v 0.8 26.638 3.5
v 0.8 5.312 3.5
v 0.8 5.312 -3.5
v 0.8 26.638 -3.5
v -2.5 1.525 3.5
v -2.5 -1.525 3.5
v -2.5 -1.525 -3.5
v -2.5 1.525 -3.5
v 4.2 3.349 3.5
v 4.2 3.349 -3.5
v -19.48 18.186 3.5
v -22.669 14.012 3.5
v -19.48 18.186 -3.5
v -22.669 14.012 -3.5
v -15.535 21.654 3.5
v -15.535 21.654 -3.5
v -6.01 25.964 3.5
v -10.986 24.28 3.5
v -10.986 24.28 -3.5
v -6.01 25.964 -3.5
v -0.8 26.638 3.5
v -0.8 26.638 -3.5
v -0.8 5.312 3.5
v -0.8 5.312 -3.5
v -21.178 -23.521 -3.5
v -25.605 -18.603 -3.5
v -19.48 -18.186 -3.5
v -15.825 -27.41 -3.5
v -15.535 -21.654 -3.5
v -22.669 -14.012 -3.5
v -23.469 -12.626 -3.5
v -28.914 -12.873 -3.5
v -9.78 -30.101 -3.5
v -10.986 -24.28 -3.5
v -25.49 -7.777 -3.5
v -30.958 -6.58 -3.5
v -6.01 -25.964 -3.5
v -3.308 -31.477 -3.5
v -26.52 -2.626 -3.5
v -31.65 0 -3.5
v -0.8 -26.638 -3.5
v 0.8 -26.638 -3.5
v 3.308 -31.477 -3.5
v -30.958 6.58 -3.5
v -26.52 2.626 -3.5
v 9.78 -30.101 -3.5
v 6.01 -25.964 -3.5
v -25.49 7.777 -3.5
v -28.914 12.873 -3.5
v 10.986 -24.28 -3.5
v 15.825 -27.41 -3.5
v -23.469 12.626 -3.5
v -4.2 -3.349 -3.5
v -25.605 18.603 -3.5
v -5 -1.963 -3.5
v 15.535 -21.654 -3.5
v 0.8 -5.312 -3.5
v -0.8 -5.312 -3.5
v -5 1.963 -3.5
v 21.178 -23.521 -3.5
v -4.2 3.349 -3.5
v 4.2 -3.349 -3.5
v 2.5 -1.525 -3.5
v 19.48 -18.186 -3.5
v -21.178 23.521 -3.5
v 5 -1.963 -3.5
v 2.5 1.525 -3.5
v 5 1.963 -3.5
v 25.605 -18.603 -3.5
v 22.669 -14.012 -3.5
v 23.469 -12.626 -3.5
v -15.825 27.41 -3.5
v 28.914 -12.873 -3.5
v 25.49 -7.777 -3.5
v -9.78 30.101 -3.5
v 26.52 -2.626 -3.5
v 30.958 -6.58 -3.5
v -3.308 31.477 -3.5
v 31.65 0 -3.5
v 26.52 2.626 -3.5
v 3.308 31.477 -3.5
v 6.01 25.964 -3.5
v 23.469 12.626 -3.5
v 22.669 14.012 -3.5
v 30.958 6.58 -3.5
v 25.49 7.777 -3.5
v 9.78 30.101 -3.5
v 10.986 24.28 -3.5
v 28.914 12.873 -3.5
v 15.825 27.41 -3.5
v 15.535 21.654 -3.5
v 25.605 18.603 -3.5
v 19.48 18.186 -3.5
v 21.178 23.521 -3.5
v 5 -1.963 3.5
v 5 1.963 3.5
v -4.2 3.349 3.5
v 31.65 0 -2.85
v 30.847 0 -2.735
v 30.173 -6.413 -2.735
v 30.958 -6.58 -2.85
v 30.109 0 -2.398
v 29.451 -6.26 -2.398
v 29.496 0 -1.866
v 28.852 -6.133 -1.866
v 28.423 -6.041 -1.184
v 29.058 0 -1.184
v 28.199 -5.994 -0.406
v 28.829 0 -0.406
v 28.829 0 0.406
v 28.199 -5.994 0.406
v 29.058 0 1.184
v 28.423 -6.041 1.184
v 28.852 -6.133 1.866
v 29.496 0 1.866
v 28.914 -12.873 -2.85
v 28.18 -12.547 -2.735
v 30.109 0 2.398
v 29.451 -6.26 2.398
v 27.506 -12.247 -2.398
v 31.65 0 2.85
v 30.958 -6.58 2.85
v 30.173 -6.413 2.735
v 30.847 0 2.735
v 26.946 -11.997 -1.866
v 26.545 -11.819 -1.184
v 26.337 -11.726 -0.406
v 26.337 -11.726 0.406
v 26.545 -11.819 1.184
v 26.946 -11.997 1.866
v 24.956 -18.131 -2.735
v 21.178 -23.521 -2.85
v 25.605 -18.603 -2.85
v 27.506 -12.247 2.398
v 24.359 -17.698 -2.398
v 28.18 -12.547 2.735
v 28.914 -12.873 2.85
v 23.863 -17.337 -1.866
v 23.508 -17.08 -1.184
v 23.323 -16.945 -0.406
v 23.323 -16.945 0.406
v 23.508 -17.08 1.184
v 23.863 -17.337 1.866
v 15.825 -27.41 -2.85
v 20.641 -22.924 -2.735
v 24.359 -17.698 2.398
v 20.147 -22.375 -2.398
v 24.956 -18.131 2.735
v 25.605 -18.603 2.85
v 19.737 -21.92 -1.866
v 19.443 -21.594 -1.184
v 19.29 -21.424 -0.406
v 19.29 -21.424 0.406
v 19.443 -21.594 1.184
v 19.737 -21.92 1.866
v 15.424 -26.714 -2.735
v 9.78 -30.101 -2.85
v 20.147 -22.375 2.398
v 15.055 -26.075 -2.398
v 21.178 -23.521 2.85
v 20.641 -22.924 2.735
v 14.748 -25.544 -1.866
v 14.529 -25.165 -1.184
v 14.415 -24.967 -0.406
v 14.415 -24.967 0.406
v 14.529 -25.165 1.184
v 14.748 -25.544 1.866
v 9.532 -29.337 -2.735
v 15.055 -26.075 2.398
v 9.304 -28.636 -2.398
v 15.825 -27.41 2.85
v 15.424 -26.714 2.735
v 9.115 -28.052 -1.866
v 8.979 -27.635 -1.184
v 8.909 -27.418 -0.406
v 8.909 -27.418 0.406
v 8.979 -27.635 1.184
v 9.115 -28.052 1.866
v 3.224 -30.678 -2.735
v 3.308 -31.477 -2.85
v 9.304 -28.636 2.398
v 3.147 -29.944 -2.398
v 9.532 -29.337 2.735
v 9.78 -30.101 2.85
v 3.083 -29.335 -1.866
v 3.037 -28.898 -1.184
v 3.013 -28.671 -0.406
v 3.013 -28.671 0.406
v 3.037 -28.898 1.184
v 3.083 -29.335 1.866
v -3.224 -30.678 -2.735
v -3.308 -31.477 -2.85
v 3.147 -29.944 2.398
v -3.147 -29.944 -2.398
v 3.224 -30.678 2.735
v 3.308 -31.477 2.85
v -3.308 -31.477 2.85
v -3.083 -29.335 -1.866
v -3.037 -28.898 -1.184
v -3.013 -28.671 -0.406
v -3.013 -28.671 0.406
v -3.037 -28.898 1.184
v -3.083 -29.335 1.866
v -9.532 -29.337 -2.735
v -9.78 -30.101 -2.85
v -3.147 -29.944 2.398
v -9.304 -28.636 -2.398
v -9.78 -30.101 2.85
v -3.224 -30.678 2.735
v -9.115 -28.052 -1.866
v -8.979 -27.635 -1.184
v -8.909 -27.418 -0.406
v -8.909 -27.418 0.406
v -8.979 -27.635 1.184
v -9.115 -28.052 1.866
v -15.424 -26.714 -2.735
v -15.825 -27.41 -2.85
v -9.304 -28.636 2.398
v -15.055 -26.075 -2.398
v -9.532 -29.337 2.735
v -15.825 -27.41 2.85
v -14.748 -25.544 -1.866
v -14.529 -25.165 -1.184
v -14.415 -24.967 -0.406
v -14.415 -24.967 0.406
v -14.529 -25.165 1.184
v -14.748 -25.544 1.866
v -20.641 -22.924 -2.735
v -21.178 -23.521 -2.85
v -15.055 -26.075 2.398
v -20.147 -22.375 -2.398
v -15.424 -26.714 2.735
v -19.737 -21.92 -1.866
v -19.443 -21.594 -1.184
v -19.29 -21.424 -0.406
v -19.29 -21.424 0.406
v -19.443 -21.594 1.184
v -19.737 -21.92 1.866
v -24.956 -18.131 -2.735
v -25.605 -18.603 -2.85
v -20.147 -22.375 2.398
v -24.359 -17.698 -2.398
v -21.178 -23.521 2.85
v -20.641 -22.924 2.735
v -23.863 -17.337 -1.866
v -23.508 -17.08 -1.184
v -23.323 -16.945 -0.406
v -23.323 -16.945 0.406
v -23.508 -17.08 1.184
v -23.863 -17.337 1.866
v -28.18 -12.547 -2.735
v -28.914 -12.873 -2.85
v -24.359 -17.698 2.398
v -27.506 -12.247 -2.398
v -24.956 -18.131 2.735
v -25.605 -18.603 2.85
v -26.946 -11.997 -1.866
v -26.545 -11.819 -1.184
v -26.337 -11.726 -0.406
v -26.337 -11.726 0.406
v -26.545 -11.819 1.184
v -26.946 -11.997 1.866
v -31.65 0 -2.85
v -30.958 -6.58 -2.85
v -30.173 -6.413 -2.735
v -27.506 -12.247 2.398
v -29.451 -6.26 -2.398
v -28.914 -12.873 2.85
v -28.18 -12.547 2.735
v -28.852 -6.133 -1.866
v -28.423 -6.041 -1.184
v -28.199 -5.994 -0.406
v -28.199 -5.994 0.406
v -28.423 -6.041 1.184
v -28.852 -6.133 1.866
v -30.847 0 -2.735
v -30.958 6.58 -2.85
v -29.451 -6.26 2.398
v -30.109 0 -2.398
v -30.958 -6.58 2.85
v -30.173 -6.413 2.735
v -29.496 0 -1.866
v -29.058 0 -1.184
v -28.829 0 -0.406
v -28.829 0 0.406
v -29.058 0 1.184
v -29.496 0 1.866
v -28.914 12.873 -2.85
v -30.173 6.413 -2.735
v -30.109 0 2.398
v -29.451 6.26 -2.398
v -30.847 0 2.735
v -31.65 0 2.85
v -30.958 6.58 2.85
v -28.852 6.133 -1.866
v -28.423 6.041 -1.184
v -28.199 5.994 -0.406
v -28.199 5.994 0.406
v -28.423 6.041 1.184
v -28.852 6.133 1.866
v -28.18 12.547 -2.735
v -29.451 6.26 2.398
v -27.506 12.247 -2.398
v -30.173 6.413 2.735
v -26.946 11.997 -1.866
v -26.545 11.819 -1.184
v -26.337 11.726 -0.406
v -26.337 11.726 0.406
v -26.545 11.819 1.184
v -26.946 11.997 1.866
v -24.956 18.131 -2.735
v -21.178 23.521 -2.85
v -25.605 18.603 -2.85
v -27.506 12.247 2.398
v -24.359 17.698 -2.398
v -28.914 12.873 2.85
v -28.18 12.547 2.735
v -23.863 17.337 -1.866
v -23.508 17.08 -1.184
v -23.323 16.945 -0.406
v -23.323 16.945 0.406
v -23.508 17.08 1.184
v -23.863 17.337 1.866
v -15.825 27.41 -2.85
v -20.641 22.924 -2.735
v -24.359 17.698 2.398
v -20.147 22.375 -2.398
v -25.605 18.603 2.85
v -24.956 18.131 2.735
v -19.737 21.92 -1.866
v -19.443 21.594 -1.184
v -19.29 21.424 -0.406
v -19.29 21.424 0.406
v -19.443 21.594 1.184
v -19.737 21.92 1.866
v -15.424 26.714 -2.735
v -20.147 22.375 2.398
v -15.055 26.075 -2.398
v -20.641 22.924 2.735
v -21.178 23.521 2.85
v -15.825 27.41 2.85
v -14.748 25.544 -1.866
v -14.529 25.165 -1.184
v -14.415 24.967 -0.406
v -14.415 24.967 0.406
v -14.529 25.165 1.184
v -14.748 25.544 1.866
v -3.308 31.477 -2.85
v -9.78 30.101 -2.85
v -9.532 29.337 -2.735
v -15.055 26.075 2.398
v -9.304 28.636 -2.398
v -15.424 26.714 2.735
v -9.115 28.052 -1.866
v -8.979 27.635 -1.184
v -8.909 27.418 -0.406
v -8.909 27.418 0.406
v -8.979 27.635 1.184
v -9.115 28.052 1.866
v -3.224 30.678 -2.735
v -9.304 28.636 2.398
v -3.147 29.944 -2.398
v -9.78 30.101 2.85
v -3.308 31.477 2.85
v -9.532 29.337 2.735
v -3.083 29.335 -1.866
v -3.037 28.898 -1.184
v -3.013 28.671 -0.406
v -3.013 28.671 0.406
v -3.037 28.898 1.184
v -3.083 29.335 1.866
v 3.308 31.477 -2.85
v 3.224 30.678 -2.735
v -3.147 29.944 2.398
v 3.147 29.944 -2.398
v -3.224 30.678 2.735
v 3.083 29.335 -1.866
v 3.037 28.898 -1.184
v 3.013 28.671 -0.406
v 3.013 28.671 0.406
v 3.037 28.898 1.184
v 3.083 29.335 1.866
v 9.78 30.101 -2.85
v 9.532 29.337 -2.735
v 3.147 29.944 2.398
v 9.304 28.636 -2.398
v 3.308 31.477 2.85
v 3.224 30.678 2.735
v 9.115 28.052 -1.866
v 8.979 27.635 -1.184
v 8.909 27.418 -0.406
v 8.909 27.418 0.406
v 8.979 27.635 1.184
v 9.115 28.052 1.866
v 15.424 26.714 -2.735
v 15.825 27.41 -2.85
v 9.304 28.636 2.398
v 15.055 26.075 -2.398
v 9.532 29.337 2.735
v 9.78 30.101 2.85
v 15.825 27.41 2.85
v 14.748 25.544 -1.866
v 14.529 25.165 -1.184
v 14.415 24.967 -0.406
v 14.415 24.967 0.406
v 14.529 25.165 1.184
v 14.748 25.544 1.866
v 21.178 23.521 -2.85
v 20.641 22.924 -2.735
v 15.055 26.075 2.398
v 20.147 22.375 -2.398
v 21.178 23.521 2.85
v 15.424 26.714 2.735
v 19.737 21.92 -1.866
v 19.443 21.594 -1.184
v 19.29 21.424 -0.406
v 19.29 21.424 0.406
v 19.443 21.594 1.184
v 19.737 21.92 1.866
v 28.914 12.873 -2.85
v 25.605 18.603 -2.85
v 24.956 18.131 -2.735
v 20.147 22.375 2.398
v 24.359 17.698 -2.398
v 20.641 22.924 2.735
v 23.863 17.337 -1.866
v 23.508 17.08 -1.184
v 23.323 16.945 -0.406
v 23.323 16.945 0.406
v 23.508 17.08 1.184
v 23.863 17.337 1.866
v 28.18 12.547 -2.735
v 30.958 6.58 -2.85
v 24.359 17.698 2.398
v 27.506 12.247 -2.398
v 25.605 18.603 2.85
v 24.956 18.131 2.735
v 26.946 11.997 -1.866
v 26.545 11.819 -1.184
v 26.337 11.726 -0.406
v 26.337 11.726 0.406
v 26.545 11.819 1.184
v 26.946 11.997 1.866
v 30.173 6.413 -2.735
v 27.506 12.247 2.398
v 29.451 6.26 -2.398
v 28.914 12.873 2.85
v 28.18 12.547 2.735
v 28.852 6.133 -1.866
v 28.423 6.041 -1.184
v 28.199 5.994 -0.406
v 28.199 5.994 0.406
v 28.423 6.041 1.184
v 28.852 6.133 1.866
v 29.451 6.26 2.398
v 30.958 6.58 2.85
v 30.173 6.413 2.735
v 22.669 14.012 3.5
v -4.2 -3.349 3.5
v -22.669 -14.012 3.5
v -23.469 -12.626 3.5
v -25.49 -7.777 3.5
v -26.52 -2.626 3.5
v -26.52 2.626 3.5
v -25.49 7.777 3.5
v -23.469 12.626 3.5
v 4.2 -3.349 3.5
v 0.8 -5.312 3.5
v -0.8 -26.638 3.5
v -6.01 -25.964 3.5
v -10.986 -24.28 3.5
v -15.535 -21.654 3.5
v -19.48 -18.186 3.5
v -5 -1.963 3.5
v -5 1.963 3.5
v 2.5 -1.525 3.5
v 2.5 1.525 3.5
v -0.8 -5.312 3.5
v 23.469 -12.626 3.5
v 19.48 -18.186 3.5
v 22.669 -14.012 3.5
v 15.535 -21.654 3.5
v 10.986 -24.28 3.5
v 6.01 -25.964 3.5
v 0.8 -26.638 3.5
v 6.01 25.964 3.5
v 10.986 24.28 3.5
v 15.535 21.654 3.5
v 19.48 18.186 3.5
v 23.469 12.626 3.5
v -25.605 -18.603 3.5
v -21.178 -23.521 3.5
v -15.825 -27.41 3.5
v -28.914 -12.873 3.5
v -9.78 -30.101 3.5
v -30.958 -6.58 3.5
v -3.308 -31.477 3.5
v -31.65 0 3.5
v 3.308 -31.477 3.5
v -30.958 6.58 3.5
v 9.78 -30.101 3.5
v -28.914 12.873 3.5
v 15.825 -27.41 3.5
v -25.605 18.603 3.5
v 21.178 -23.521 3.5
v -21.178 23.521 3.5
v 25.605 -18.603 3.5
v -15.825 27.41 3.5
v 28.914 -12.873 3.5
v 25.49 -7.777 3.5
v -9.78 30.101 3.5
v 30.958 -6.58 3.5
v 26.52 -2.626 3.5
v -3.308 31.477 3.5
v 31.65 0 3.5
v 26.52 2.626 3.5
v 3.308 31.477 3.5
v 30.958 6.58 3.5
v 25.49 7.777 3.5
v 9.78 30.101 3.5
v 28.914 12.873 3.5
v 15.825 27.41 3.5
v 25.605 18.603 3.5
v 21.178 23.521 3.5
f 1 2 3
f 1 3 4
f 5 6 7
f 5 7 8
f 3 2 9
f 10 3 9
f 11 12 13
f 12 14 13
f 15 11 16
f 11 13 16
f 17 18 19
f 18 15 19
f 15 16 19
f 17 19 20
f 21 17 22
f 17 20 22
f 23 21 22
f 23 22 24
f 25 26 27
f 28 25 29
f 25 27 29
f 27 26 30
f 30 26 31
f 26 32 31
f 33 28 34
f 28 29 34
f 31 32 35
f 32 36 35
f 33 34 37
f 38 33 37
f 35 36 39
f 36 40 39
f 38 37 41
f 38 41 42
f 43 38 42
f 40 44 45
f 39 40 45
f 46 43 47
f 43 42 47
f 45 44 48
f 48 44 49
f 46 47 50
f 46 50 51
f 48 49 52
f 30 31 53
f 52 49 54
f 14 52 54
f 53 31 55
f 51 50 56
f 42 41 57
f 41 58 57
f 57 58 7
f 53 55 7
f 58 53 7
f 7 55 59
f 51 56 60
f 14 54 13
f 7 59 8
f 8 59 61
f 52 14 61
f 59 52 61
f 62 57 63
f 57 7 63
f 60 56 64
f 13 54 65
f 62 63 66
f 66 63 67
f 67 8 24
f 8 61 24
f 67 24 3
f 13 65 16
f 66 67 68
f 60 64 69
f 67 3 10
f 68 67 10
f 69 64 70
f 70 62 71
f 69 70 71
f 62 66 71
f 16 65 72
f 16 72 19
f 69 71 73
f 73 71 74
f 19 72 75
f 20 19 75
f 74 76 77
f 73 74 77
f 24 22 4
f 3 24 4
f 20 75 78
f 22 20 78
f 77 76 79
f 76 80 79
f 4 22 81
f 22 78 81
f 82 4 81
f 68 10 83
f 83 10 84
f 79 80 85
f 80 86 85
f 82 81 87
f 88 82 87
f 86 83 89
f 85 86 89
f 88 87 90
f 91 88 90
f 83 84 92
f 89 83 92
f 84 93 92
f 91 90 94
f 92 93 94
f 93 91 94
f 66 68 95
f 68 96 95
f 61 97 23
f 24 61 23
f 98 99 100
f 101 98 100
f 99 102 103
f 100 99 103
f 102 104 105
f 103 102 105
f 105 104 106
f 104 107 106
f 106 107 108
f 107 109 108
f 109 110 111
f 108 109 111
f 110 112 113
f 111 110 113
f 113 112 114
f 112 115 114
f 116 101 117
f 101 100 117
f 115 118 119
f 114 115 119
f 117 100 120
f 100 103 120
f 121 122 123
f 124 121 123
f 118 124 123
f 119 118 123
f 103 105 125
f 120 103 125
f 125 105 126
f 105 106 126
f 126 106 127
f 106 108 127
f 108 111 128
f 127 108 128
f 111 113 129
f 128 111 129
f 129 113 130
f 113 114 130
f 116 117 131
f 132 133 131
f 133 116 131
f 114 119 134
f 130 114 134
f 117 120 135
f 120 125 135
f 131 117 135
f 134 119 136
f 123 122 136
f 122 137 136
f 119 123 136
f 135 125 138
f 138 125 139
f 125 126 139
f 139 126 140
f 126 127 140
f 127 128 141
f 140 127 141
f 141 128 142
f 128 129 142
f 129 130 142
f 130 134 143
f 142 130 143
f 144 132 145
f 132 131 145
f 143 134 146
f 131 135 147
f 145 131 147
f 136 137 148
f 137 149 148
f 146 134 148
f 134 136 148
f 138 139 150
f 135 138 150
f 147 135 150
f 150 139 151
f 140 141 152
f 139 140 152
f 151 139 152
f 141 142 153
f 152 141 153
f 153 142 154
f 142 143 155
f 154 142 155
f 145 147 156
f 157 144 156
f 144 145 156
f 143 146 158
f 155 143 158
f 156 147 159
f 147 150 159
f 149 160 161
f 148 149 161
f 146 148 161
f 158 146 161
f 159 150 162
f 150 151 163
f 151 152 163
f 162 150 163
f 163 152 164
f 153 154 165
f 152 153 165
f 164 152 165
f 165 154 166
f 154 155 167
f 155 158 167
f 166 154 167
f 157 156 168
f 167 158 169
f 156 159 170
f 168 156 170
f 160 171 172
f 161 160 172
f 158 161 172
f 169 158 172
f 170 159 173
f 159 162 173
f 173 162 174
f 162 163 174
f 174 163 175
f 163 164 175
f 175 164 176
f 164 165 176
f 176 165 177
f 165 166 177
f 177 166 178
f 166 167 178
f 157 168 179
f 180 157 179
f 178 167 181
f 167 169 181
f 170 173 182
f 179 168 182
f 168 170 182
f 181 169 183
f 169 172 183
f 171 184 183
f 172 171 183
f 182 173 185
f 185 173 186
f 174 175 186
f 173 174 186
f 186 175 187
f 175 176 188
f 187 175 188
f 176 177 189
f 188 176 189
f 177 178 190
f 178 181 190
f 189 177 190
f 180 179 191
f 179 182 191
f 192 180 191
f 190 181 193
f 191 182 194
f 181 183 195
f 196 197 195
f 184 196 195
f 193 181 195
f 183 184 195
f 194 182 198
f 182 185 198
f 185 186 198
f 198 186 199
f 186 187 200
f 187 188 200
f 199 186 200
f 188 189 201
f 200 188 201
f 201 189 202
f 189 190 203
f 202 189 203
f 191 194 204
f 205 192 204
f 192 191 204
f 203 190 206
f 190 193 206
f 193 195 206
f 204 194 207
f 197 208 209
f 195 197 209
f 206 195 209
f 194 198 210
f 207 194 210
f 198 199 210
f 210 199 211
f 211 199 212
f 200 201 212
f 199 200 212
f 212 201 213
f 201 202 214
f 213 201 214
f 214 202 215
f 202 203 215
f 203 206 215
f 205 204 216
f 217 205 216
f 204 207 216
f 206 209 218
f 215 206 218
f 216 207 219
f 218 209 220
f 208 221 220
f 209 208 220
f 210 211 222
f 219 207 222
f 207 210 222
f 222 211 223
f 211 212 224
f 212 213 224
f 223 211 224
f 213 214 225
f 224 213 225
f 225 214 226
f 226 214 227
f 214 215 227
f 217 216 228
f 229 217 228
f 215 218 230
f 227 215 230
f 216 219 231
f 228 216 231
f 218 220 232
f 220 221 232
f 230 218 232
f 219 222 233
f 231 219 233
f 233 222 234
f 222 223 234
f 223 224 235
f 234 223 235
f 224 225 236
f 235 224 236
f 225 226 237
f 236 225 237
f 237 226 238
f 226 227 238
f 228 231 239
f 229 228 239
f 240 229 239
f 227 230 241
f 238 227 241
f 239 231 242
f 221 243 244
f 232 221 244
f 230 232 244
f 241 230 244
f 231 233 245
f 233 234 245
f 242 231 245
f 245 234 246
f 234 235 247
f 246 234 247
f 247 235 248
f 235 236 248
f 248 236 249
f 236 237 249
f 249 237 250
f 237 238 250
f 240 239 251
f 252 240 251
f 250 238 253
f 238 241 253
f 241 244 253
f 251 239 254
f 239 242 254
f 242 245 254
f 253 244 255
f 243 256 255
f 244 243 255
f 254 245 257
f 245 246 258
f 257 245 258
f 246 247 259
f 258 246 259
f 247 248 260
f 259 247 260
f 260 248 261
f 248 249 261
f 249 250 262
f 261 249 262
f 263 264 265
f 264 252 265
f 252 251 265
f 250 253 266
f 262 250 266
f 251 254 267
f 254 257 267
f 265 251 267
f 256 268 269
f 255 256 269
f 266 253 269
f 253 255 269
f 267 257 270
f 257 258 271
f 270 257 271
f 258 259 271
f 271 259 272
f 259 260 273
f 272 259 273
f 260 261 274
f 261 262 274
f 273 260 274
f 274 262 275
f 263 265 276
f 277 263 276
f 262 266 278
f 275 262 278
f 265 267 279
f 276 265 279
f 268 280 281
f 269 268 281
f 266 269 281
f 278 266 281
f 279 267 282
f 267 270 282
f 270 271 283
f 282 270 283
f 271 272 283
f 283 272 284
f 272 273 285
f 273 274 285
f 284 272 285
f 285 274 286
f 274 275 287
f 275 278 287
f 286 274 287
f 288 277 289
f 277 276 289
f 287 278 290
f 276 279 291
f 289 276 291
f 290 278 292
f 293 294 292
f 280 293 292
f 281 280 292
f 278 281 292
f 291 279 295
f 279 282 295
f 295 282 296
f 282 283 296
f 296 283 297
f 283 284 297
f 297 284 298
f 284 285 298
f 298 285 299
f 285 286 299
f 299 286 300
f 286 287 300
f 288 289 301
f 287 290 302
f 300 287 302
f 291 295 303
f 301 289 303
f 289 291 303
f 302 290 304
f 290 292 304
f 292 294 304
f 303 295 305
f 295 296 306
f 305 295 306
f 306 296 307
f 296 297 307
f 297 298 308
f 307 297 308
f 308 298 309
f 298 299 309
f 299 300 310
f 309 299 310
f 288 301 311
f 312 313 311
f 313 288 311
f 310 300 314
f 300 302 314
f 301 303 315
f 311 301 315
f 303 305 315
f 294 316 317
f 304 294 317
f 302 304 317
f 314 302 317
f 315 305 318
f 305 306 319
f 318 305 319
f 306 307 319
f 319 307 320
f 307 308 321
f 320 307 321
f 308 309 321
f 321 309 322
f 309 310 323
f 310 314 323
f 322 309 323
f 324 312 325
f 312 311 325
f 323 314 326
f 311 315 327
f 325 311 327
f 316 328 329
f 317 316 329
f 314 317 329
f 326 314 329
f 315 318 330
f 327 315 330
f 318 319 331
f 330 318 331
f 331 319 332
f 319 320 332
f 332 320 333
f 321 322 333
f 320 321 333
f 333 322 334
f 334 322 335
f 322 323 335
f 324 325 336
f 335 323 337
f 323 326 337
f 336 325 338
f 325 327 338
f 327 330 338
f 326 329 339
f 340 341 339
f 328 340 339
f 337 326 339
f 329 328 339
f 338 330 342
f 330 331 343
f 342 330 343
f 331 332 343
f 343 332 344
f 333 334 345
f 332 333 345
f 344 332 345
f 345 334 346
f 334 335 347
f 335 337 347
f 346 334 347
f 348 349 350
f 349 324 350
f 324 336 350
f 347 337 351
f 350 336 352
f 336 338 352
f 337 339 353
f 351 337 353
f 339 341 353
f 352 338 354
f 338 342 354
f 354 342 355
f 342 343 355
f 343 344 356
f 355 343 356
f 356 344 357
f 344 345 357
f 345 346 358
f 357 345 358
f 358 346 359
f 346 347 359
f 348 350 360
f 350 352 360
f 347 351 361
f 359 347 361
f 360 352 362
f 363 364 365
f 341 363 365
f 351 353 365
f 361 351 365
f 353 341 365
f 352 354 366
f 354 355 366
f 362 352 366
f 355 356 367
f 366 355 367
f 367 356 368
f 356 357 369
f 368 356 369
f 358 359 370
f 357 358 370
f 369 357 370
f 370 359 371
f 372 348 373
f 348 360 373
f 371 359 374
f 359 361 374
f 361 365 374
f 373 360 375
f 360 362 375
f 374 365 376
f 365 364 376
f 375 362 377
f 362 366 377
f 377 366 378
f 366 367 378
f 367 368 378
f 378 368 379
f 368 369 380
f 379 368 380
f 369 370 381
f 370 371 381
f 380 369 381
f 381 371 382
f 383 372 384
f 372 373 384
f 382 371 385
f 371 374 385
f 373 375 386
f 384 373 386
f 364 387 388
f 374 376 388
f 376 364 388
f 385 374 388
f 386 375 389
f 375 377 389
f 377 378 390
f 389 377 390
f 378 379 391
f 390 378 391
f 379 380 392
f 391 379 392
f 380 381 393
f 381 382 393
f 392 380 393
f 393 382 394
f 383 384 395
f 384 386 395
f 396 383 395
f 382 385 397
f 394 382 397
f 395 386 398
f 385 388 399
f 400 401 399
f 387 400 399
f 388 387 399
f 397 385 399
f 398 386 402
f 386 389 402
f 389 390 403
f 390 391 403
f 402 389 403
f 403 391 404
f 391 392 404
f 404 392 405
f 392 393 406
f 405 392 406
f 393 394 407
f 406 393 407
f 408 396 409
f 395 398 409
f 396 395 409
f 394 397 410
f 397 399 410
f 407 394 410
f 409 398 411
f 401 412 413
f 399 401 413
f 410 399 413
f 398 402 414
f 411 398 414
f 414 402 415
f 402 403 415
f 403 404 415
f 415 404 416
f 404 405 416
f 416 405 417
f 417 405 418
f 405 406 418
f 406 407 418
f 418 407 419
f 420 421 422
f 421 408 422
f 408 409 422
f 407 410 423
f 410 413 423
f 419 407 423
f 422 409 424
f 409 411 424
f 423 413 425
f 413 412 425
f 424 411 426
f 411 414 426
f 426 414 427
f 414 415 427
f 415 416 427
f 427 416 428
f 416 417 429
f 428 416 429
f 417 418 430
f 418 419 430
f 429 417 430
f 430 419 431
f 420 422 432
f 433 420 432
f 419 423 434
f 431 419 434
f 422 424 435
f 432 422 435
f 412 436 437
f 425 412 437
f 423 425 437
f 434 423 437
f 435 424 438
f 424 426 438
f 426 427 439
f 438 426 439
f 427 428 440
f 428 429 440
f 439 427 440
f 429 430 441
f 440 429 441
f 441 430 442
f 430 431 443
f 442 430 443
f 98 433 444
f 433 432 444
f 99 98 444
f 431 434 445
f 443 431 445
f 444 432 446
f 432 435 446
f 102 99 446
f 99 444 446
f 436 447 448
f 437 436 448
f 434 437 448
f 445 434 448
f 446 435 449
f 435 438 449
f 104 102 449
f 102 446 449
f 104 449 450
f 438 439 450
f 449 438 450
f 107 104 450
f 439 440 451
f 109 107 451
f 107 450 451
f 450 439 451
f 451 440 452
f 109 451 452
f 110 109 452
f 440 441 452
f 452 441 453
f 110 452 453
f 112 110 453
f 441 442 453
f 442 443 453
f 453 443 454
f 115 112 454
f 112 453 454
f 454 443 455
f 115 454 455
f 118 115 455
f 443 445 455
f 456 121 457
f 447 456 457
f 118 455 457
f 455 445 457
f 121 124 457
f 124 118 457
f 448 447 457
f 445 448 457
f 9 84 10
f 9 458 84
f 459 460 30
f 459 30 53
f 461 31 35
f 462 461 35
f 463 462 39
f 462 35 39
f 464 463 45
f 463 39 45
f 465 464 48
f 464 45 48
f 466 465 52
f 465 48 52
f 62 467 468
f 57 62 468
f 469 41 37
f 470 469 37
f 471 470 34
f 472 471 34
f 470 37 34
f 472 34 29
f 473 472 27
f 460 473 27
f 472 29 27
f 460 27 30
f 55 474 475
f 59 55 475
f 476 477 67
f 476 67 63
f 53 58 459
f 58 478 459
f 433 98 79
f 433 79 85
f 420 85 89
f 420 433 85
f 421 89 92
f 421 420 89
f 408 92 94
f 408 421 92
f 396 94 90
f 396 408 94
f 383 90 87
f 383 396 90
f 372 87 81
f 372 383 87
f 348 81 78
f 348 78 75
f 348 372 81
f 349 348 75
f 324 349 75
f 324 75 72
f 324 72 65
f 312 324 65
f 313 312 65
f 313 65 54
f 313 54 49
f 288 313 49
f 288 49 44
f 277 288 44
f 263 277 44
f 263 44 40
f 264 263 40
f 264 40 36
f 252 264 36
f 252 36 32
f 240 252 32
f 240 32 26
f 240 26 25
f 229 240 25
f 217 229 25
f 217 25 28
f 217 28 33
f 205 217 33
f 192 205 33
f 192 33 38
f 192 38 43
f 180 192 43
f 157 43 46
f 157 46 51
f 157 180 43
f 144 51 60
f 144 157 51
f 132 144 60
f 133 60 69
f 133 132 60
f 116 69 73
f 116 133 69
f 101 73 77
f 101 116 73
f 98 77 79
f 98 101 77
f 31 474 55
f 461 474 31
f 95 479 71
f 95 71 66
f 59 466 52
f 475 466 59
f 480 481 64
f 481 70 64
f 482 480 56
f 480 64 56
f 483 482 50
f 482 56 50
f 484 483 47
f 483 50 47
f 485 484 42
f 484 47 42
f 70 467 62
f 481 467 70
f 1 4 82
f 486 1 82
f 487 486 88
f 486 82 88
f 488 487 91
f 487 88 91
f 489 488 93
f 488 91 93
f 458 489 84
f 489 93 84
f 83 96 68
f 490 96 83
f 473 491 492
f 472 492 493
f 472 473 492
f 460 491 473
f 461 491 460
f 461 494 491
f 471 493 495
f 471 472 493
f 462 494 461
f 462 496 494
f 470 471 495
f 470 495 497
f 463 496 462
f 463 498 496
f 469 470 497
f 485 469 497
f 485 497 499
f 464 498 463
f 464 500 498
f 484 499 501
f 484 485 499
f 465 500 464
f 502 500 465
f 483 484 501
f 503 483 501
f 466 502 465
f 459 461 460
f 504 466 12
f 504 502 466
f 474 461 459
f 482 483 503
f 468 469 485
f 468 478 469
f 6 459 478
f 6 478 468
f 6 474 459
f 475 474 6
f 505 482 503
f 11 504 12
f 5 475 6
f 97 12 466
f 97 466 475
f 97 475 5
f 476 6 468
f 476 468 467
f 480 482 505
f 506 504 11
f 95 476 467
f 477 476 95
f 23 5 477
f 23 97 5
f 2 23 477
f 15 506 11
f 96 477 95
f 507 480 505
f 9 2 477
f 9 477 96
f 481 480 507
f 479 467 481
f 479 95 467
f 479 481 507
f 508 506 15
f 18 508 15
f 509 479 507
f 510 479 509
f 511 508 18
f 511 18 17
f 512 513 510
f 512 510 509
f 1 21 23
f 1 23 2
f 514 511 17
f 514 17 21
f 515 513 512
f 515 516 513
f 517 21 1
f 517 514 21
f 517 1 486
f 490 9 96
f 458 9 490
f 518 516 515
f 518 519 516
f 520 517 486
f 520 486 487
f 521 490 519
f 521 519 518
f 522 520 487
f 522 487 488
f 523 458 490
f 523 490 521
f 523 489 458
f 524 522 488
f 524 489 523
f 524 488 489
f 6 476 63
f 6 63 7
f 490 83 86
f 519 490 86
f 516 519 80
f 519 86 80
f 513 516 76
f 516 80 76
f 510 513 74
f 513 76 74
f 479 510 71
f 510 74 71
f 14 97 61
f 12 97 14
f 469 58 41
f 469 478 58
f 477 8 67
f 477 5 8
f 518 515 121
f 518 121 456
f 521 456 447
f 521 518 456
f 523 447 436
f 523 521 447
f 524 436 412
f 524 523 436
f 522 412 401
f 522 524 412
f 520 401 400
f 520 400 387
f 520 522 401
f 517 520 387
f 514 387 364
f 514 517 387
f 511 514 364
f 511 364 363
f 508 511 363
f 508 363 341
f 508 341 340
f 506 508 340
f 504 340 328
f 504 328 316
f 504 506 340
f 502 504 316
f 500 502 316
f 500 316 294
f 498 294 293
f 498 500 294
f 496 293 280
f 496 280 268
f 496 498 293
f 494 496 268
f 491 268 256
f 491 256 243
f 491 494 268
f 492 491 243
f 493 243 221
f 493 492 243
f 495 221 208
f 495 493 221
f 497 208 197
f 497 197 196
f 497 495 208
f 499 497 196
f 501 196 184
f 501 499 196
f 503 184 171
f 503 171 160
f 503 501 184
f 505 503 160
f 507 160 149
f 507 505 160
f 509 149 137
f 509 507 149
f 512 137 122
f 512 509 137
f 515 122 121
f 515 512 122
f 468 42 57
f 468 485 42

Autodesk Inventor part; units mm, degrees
ref_plane "YZ Plane" through (0, 0, 0) normal (1, 0, 0) x (0, 1, 0)
ref_plane "XZ Plane" through (0, 0, 0) normal (0, 1, 0) x (-1, 0, 0)
ref_plane "XY Plane" through (0, 0, 0) normal (0, 0, 1) x (1, 0, 0)
sketch "スケッチ1" plane through (0, 0, 0) normal (0, 1, 0) x (-1, 0, 0)
  line L0 (0, 0) -> (-64.0652, 0) construction
  circle A0 centre (-31.65, 0) radius 2.85
  line L1 (-26.65, -3.5) -> (-31.65, -3.5)
  line L2 (-31.65, -3.5) -> (-31.65, 3.5)
  line L3 (-31.65, 3.5) -> (-26.65, 3.5)
  line L4 (-26.65, 3.5) -> (-26.65, -3.5)
  line L5 (0, -4.9) -> (0, 4.9) projected
  point P0 (-31.65, 2.85)
  point P1 (-31.65, -2.85)
  dimension "P_DIA" = 5.7
  dimension "P_D1" = 31.65
  dimension "d2" = 7
  dimension "d3" = 5
revolve "リム" add sketch "スケッチ1" angle 360 about axis through (0, 0, -10) along (0, 0, 1) contours A0 L2 L3 L4 L1
sketch "スケッチ3" plane through (0, 0, 3.5) normal (0, 0, 1) x (1, 0, 0)
  line L0 (-5, 2.8868) -> (0, 5.7735)
  line L1 (0, 5.7735) -> (5, 2.8868)
  line L2 (5, 2.8868) -> (5, -2.8868)
  line L3 (5, -2.8868) -> (0, -5.7735)
  line L4 (0, -5.7735) -> (-5, -2.8868)
  line L5 (-5, -2.8868) -> (-5, 2.8868)
  point P0 (0, 0)
  point P1 (0, 0)
  dimension "HUB_DIA" = 10
extrude "ハブ" add sketch "スケッチ3" against normal up to surface (7 mm away)
sketch "スケッチ4" plane through (0, 0, 3.5) normal (0, 0, 1) x (1, 0, 0)
  line L0 (-0.8, 0) -> (0.8, 0)
  line L1 (0.8, 0) -> (0.8, 26.65)
  line L2 (0.8, 26.65) -> (-0.8, 26.65)
  line L3 (-0.8, 26.65) -> (-0.8, 0)
  circle A0 centre (0, 0) radius 26.65 projected
  point P0 (0, 26.65)
  dimension "SPOKE_THIN" = 1.6
extrude "スポーク" add sketch "スケッチ4" against normal up to surface (7 mm away) contours L3 A0 L1 L0 | L3 L2 A0 | A0 L2 L1 picked at (0, 8.8833)
pattern_circular "円形状パターン1" count 6 over 360 about axis through (0, 0, -10) along (0, 0, 1) of "スポーク"
sketch "スケッチ5" plane through (0, 0, 3.5) normal (0, 0, 1) x (1, 0, 0)
  line L0 (-2.5, 1.525) -> (2.5, 1.525)
  line L1 (2.5, 1.525) -> (2.5, -1.525)
  line L2 (2.5, -1.525) -> (-2.5, -1.525)
  line L3 (-2.5, -1.525) -> (-2.5, 1.525)
  point P0 (0, 0)
  point P1 (0, 1.525)
  point P2 (-2.5, 0)
  dimension "d15" = 5
  dimension "d16" = 3.05
extrude "軸穴" cut sketch "スケッチ5" against normal through all
equation "\"P_D1\" = 0.5 * INNER_DIA + 0.5 * P_DIA"
equation "\"INNER_DIA\" = 57.6"
properties part number "Wheel-D69C"
